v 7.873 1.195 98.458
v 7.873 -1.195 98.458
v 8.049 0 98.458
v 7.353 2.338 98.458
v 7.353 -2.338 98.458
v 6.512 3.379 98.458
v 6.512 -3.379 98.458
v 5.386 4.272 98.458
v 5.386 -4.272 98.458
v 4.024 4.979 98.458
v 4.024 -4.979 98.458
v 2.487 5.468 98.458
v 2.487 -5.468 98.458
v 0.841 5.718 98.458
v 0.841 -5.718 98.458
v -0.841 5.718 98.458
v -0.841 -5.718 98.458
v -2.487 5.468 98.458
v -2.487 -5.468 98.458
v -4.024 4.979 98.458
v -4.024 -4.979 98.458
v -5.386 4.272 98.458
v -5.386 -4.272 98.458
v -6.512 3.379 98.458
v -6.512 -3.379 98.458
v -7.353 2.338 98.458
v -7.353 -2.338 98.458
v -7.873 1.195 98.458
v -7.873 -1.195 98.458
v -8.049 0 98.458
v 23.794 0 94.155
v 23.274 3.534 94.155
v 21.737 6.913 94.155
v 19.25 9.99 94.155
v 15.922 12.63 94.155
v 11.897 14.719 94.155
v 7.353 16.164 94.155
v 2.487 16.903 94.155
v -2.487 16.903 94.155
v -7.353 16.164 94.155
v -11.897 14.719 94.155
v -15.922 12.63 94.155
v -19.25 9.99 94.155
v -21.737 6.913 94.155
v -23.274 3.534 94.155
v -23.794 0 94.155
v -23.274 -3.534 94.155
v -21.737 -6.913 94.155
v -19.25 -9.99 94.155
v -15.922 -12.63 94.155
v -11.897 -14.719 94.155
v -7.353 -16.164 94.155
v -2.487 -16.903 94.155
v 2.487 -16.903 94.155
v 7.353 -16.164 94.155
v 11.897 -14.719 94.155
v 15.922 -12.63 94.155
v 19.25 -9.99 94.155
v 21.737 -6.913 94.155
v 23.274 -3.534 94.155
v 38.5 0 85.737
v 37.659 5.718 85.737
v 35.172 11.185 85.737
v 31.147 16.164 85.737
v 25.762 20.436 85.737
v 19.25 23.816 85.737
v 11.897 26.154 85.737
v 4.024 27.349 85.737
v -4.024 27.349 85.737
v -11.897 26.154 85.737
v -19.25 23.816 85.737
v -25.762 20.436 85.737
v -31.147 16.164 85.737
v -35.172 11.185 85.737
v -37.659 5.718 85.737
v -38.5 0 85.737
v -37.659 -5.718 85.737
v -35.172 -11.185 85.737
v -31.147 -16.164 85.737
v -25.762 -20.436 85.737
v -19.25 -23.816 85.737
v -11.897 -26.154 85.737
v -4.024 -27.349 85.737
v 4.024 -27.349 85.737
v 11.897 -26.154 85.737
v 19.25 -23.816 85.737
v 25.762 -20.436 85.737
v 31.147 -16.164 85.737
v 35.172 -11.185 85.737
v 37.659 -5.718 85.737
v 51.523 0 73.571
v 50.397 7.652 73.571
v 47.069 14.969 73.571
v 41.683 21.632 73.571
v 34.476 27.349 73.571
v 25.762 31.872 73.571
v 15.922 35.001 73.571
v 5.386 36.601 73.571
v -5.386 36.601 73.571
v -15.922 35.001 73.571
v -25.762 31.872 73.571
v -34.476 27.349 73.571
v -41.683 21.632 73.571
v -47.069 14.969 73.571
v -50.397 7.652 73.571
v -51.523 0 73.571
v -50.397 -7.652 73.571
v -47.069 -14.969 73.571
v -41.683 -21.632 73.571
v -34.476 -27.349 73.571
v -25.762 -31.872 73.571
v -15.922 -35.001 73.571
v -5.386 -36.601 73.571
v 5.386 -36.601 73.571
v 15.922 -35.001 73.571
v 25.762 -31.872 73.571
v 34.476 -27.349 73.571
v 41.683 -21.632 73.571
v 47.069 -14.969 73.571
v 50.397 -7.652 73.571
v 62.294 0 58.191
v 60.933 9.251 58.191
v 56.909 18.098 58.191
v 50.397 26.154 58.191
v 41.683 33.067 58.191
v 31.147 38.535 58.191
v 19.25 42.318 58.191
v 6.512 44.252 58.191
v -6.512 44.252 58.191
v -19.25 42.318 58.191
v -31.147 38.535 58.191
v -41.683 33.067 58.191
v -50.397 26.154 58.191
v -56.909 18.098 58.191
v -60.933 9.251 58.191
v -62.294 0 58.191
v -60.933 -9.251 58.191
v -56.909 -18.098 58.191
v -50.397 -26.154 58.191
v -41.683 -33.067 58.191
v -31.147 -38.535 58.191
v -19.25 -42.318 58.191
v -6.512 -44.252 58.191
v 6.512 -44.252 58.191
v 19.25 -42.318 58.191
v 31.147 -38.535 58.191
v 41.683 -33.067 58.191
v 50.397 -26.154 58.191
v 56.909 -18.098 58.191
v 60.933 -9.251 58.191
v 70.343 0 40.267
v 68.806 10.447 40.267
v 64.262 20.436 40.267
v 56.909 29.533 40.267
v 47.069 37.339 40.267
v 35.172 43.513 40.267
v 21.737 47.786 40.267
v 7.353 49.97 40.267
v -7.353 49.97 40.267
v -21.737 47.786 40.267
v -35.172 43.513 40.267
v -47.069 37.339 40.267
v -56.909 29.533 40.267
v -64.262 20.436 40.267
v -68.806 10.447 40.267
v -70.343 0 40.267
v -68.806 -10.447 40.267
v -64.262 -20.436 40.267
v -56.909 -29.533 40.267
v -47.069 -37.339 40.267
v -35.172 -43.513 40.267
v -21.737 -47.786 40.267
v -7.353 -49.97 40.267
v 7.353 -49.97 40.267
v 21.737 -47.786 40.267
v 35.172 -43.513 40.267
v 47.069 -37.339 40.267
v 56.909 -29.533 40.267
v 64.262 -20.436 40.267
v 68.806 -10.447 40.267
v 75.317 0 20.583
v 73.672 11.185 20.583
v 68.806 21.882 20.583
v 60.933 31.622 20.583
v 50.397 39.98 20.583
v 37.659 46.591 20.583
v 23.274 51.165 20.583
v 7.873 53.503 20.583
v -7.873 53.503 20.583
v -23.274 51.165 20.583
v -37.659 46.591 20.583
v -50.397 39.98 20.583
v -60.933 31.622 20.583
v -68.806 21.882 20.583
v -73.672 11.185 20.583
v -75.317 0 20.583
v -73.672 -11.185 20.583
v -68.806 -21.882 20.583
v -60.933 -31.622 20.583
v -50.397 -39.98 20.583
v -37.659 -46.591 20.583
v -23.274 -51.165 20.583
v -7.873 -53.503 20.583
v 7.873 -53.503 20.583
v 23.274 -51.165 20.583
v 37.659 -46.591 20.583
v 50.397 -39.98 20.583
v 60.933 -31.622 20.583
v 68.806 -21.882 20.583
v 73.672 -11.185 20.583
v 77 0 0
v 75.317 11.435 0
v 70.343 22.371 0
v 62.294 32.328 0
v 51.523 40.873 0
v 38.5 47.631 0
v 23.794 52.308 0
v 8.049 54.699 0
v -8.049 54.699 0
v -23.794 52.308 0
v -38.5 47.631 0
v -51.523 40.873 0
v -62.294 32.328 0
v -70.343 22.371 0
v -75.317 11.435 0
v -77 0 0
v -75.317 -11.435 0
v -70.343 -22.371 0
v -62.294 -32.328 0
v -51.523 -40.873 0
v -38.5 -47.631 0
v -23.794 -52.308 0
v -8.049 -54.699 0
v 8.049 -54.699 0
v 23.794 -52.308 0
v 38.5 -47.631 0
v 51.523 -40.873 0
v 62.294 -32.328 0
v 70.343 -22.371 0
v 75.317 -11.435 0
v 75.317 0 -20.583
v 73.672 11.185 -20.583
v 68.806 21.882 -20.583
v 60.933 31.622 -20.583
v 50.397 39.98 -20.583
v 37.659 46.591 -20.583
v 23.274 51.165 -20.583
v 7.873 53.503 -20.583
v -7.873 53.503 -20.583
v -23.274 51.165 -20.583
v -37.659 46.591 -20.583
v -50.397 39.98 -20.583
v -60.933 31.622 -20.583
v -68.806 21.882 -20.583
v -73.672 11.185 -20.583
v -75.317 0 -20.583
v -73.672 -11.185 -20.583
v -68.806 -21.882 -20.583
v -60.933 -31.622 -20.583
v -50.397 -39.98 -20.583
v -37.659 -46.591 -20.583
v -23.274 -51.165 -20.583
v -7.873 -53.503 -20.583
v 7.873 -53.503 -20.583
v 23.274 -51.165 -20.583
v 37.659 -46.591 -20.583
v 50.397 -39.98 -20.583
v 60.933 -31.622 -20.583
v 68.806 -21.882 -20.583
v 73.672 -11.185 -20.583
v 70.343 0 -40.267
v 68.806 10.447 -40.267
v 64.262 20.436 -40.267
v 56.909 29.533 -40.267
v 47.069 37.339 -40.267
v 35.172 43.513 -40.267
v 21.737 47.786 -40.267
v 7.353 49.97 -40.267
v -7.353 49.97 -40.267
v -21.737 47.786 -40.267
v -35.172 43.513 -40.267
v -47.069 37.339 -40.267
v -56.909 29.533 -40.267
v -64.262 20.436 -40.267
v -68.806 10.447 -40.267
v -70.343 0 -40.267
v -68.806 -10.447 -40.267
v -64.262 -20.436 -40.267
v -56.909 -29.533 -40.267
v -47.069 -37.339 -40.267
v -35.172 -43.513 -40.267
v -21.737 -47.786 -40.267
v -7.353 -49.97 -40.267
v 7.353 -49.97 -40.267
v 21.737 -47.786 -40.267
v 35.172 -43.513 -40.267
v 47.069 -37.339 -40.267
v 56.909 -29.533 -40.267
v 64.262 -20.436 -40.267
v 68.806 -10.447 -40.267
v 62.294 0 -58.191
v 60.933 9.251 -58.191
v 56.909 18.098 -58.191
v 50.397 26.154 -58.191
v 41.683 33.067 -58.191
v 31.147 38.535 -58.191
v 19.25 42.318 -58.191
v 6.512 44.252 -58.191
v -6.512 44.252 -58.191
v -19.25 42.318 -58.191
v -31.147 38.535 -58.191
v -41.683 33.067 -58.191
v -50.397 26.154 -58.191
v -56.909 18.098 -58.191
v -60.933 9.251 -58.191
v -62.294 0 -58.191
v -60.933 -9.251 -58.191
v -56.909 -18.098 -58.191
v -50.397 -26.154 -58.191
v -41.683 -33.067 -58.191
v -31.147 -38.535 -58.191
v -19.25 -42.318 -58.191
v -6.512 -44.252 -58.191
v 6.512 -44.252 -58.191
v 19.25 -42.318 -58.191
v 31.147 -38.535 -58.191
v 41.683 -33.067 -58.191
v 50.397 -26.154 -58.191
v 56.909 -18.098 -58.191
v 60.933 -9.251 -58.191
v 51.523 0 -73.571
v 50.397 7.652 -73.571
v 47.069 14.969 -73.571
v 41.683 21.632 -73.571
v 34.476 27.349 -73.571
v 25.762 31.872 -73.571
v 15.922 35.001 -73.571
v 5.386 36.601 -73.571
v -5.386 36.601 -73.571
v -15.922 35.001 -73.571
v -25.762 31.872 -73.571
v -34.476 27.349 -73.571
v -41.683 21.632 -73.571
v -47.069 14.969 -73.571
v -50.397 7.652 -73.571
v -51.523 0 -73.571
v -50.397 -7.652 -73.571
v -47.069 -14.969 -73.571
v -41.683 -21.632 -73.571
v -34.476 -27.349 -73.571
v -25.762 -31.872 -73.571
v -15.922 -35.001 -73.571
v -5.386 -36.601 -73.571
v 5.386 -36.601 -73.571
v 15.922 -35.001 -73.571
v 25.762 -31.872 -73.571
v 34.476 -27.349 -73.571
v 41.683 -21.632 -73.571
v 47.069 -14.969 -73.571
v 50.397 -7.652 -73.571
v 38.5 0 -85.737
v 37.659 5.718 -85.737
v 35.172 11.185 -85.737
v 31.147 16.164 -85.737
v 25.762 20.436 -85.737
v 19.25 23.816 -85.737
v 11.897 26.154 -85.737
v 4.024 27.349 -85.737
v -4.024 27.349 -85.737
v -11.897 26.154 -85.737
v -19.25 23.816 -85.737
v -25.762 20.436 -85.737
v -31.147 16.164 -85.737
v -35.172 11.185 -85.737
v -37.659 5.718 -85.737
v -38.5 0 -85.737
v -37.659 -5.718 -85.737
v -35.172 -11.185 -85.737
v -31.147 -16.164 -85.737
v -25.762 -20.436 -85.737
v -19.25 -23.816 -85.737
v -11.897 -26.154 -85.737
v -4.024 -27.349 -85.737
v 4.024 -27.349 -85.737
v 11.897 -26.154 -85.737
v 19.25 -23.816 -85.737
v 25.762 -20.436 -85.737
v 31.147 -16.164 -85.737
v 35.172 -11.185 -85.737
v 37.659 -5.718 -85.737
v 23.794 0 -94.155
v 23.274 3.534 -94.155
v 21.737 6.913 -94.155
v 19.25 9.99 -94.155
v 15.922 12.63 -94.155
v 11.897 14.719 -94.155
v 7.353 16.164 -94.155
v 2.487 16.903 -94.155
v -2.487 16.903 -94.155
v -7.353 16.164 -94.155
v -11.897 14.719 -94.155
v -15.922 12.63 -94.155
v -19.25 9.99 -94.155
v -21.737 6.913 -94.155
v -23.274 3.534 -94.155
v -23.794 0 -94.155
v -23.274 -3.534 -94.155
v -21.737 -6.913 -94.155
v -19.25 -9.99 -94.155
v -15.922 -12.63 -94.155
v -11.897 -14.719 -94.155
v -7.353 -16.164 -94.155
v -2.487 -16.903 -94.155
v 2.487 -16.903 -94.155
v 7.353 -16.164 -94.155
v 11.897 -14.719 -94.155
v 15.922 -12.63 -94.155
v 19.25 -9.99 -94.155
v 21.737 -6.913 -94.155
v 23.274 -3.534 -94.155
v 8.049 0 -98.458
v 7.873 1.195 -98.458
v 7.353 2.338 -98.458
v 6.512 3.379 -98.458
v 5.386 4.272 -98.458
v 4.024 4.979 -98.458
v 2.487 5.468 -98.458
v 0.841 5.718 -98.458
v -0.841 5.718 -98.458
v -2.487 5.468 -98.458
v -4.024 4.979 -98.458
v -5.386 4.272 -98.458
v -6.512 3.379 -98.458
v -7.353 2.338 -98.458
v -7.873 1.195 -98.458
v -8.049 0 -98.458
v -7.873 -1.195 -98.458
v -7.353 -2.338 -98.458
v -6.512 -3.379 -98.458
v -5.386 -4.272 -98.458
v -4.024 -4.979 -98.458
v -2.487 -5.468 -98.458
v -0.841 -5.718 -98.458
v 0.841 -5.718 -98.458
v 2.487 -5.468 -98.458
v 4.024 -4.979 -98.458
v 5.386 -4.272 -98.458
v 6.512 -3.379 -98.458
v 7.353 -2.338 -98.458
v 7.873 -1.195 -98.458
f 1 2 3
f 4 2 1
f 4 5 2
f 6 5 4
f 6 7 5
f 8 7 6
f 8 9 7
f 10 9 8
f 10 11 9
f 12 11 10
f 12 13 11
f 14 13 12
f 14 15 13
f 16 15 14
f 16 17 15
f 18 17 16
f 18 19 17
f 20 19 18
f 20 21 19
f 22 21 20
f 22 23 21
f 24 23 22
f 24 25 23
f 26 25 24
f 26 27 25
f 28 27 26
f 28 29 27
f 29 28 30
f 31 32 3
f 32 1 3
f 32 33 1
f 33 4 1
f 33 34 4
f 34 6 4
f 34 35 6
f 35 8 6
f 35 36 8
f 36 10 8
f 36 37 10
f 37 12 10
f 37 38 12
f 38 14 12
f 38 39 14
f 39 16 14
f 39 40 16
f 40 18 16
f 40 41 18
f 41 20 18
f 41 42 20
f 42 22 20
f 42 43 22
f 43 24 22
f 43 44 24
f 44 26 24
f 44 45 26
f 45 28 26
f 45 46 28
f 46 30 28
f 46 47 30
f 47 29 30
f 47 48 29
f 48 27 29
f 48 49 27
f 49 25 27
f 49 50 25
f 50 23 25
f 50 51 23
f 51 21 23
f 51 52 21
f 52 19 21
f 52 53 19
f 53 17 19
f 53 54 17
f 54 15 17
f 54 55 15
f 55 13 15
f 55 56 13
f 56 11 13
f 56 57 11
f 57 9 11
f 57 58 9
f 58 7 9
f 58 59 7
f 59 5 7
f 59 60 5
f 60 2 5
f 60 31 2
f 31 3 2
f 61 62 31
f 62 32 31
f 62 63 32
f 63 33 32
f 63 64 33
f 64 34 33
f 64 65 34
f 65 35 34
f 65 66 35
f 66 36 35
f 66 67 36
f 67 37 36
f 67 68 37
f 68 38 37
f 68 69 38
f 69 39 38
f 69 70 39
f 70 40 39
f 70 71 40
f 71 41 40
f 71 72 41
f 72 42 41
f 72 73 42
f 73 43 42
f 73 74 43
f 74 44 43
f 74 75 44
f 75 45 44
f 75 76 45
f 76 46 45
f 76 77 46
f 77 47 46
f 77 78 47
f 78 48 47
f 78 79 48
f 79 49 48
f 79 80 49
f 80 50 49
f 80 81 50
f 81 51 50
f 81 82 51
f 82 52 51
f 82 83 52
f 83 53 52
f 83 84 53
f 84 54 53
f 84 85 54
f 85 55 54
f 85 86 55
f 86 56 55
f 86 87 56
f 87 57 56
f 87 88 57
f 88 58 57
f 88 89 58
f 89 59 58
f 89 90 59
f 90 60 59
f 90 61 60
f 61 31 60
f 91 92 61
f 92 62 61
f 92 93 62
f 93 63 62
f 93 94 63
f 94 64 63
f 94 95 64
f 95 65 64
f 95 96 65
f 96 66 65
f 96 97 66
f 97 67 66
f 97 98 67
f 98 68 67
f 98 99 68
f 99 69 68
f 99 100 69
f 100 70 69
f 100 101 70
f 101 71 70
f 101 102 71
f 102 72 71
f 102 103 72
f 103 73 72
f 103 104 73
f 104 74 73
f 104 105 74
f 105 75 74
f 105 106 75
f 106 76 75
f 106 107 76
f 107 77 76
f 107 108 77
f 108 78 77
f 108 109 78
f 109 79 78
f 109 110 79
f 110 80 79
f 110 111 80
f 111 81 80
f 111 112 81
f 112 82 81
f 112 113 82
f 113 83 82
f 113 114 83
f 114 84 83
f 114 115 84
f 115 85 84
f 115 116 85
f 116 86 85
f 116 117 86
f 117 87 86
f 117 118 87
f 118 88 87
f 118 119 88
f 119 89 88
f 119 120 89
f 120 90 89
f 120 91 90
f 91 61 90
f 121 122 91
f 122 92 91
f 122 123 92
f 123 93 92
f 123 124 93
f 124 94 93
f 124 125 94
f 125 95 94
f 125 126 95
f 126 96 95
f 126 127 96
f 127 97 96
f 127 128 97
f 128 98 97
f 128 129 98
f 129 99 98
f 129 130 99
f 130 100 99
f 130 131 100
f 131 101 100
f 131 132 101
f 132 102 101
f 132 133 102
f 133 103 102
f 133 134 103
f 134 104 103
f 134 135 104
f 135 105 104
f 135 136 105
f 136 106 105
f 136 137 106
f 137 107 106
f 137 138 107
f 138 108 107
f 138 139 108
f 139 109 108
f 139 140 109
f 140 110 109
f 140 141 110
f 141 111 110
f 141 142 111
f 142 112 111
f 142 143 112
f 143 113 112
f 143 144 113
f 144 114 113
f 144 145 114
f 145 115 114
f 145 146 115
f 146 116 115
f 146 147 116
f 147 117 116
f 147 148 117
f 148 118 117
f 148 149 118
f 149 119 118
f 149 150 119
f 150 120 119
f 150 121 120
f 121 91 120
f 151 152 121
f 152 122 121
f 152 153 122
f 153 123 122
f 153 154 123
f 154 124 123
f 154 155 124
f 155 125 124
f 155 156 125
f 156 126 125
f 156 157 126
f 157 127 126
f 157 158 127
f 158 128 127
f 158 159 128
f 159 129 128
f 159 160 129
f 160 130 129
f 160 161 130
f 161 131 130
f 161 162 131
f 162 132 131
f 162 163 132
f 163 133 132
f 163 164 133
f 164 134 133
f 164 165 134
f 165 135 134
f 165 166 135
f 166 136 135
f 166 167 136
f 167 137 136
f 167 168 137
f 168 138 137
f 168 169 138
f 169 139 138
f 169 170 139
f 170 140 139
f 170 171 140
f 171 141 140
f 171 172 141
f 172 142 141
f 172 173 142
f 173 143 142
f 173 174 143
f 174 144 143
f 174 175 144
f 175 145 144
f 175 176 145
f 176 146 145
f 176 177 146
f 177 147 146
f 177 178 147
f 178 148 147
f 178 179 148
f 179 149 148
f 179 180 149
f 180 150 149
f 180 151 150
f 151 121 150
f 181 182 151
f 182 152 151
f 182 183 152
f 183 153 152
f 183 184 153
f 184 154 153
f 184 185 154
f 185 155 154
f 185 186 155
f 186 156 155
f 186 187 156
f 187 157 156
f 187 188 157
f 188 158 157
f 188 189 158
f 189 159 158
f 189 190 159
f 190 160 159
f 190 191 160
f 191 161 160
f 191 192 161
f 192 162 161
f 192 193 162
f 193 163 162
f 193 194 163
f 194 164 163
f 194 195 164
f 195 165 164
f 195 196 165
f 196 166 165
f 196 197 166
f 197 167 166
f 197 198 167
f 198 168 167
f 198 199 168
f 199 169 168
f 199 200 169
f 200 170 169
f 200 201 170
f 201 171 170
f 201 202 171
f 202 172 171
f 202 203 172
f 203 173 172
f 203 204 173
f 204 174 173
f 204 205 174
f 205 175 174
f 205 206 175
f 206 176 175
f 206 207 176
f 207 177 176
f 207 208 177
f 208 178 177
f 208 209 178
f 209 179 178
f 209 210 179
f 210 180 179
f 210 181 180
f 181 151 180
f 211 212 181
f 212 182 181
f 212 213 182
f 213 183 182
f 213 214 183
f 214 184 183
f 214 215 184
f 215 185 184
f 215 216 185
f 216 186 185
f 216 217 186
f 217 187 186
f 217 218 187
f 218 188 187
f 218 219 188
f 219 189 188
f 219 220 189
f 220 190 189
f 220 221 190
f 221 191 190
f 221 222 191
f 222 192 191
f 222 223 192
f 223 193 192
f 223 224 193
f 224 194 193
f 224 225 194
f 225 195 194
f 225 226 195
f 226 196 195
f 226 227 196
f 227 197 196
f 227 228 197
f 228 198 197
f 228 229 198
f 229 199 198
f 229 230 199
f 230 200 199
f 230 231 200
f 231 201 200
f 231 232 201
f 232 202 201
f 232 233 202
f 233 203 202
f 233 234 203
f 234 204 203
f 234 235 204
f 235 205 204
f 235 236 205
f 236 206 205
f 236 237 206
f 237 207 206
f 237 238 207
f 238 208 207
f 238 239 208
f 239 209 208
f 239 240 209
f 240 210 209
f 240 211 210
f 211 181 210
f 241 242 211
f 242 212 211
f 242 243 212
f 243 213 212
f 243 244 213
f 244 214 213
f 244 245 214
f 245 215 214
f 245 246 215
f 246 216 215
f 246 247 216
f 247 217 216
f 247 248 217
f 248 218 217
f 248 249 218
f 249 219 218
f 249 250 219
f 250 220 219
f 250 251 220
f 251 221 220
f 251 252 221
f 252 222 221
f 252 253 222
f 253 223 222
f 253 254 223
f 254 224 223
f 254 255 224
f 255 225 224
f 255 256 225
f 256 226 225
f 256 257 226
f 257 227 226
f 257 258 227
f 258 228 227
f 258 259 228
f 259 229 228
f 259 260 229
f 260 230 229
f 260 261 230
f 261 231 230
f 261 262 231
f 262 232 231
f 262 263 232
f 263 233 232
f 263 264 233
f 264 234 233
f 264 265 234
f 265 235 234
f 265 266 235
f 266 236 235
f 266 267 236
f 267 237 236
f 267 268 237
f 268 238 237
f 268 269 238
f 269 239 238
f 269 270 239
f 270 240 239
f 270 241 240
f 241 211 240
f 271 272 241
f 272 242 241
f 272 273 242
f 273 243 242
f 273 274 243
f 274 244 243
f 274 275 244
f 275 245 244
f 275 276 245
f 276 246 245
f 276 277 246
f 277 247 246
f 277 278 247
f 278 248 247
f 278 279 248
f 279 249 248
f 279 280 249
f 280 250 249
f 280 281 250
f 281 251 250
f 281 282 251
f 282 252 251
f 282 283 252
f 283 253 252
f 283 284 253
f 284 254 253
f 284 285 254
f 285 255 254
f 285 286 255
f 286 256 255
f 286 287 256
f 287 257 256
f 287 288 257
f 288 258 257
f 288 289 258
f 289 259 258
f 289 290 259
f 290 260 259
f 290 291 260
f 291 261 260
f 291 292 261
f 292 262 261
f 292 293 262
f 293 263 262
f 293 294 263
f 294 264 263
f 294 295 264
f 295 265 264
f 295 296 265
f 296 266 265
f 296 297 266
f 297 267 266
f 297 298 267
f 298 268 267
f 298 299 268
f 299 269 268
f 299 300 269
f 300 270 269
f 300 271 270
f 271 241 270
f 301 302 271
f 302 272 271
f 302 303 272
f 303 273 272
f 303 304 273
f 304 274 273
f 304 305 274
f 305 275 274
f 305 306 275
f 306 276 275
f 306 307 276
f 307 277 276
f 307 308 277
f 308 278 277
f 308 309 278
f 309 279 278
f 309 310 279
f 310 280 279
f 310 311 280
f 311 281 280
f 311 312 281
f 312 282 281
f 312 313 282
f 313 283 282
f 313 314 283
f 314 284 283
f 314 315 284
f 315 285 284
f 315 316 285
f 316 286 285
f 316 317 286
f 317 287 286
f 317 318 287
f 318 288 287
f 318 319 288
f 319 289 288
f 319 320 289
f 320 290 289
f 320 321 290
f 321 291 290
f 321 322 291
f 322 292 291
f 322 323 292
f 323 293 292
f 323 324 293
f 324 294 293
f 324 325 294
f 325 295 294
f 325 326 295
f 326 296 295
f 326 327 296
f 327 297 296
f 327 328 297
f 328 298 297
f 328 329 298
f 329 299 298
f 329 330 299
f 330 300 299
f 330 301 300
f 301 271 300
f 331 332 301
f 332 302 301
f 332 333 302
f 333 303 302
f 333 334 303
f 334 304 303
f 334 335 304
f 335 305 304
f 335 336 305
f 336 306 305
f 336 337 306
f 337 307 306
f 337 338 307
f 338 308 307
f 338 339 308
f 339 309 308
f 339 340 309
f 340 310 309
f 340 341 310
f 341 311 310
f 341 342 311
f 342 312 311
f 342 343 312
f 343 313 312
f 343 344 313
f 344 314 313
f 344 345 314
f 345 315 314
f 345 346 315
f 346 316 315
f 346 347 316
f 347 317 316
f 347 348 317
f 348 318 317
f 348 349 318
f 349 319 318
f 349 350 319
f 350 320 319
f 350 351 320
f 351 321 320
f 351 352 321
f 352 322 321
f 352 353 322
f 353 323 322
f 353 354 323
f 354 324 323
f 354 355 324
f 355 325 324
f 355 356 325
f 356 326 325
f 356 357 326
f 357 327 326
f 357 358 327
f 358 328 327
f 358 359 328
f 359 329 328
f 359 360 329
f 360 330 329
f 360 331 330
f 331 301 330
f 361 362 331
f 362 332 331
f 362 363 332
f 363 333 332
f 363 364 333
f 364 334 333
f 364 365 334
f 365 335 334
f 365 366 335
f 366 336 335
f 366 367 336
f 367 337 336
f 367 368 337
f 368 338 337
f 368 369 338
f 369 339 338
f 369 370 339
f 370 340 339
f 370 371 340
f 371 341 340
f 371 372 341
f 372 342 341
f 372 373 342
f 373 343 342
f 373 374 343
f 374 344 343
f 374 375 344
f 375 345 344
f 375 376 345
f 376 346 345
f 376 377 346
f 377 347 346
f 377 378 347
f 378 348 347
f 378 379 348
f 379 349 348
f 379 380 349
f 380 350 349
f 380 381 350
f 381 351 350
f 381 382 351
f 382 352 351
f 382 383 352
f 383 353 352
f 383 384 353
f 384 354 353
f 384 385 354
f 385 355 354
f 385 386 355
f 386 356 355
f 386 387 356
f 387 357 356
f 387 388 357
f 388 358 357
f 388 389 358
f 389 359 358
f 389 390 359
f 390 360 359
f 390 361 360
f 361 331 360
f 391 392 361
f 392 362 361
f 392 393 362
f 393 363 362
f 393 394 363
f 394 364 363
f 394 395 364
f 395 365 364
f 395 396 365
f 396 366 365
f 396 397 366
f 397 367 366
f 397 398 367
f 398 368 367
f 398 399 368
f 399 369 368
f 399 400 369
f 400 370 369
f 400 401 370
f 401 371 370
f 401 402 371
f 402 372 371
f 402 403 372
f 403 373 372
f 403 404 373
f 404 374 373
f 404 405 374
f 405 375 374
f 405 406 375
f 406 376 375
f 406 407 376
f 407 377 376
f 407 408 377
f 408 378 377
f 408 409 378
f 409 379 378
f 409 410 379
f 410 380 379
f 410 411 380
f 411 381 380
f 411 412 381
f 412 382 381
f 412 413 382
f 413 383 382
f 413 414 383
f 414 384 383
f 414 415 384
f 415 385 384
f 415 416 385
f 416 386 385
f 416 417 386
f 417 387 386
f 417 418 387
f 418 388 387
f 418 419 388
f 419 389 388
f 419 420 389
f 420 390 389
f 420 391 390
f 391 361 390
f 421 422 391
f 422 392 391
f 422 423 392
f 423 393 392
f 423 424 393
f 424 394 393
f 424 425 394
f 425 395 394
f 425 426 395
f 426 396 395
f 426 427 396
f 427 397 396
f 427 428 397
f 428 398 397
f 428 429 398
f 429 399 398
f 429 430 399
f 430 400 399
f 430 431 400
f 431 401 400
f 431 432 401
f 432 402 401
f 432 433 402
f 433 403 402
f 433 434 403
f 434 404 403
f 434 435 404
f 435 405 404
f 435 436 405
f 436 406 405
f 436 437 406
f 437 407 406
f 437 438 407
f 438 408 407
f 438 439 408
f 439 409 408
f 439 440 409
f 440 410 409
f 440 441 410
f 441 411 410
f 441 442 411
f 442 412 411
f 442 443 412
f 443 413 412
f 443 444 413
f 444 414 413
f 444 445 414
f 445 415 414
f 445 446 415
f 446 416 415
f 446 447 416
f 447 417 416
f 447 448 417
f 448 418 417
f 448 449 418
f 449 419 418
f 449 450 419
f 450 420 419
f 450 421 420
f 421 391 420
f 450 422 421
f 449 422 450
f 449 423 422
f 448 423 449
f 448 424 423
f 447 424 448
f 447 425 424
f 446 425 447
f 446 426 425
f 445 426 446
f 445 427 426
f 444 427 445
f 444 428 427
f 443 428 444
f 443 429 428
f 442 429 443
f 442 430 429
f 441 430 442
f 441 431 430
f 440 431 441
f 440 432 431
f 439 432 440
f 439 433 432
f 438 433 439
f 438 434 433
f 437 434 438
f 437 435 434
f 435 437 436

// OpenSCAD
// Generated by SolidPython 1.0.1 on 2020-07-29 00:46:47


scale(v = [7, 5, 9]) {
	sphere(r = 11);
}
/***********************************************
*********      SolidPython code:      **********
************************************************
 
# import packages: SolidPython
from solid import *
from solid.utils import *
from itertools import chain, combinations, permutations


class Resize:

    def __init__(self, scad_file):
        self.scad_file = scad_file
        #self.scad_file = import_scad(scad_file)
        # cone/cylinder param:
        self.r1 = 0
        self.r2 = 0
        self.h = 0
        # rectangular prism param:
        self.w = 0
        self.l = 0
        # ellipse param:
        self.r = 0

    # import OpenScad code (file name corresponds to shape)


    # classify shape + parameters
    def assign(self, param1, param2, param3):
        if self.scad_file == 'cone.scad':
            self.r1 = param1
            self.r2 = param2
            self.h = param3
        elif self.scad_file == 'cylinder.scad':
            self.r1 = param1
            self.r2 = param2
            self.h = param3
        elif self.scad_file == 'rectangularPrism.scad':
            self.h = param1
            self.l = param2
            self.w = param3
        else:
            self.r = param1
            self.h = param2

    # resize parameters
    def iterate(self):
        x = range(3, 20, 2)
        i = 1
        if self.scad_file == 'cone.scad':
            tempList = list(permutations(x, 2))
            for temp in tempList:
                param1 = temp[0]
                param2 = temp[1]
                filepath = 'produced_scad_files/' + 'cone' + str(param1) + '_' + str(param2) + '_' + '.scad'
                scad_render_to_file(cylinder(h=param1, r1=param2, r2=0), filepath)

        elif self.scad_file == 'cylinder.scad':
            tempList = list(permutations(x, 3))
            for temp in tempList:
                param1 = temp[0]
                param2 = temp[1]
                filepath = 'produced_scad_files/' + 'cylinder' + str(param1) + '_' + str(param2) + '_' + '.scad'
                scad_render_to_file(cylinder(h=param1, r1=param2, r2=param2), filepath)

        elif self.scad_file == 'rectangularPrism.scad':
            tempList = list(permutations(x, 3))
            for temp in tempList:
                param1 = temp[0]
                param2 = temp[1]
                param3 = temp[2]
                filepath = 'produced_scad_files/' + 'rectangularPrism' + str(param1) + '_' + str(param2) + '_' + str(
                    param3) + '.scad'
                scad_render_to_file(cube(size=(param1, param2, param3)), filepath)

        elif self.scad_file == 'ellipse.scad':
            tempList = list(permutations(x, 4))
            for temp in tempList:
                param1 = temp[0]
                param2 = temp[1]
                param3 = temp[2]
                param4 = temp[3]
                filepath = 'produced_scad_files/' + 'ellipse' + str(param1) + '_' + str(param2) + '_' + str(param3) + '_' + str(param4) + '.scad'
                scad_render_to_file(scale([param1, param2, param3])(sphere(r=param4)), filepath)

    def render_to_scadfile(self):
        scad_render_to_file(scad, 'example.scad') 
 
************************************************/
